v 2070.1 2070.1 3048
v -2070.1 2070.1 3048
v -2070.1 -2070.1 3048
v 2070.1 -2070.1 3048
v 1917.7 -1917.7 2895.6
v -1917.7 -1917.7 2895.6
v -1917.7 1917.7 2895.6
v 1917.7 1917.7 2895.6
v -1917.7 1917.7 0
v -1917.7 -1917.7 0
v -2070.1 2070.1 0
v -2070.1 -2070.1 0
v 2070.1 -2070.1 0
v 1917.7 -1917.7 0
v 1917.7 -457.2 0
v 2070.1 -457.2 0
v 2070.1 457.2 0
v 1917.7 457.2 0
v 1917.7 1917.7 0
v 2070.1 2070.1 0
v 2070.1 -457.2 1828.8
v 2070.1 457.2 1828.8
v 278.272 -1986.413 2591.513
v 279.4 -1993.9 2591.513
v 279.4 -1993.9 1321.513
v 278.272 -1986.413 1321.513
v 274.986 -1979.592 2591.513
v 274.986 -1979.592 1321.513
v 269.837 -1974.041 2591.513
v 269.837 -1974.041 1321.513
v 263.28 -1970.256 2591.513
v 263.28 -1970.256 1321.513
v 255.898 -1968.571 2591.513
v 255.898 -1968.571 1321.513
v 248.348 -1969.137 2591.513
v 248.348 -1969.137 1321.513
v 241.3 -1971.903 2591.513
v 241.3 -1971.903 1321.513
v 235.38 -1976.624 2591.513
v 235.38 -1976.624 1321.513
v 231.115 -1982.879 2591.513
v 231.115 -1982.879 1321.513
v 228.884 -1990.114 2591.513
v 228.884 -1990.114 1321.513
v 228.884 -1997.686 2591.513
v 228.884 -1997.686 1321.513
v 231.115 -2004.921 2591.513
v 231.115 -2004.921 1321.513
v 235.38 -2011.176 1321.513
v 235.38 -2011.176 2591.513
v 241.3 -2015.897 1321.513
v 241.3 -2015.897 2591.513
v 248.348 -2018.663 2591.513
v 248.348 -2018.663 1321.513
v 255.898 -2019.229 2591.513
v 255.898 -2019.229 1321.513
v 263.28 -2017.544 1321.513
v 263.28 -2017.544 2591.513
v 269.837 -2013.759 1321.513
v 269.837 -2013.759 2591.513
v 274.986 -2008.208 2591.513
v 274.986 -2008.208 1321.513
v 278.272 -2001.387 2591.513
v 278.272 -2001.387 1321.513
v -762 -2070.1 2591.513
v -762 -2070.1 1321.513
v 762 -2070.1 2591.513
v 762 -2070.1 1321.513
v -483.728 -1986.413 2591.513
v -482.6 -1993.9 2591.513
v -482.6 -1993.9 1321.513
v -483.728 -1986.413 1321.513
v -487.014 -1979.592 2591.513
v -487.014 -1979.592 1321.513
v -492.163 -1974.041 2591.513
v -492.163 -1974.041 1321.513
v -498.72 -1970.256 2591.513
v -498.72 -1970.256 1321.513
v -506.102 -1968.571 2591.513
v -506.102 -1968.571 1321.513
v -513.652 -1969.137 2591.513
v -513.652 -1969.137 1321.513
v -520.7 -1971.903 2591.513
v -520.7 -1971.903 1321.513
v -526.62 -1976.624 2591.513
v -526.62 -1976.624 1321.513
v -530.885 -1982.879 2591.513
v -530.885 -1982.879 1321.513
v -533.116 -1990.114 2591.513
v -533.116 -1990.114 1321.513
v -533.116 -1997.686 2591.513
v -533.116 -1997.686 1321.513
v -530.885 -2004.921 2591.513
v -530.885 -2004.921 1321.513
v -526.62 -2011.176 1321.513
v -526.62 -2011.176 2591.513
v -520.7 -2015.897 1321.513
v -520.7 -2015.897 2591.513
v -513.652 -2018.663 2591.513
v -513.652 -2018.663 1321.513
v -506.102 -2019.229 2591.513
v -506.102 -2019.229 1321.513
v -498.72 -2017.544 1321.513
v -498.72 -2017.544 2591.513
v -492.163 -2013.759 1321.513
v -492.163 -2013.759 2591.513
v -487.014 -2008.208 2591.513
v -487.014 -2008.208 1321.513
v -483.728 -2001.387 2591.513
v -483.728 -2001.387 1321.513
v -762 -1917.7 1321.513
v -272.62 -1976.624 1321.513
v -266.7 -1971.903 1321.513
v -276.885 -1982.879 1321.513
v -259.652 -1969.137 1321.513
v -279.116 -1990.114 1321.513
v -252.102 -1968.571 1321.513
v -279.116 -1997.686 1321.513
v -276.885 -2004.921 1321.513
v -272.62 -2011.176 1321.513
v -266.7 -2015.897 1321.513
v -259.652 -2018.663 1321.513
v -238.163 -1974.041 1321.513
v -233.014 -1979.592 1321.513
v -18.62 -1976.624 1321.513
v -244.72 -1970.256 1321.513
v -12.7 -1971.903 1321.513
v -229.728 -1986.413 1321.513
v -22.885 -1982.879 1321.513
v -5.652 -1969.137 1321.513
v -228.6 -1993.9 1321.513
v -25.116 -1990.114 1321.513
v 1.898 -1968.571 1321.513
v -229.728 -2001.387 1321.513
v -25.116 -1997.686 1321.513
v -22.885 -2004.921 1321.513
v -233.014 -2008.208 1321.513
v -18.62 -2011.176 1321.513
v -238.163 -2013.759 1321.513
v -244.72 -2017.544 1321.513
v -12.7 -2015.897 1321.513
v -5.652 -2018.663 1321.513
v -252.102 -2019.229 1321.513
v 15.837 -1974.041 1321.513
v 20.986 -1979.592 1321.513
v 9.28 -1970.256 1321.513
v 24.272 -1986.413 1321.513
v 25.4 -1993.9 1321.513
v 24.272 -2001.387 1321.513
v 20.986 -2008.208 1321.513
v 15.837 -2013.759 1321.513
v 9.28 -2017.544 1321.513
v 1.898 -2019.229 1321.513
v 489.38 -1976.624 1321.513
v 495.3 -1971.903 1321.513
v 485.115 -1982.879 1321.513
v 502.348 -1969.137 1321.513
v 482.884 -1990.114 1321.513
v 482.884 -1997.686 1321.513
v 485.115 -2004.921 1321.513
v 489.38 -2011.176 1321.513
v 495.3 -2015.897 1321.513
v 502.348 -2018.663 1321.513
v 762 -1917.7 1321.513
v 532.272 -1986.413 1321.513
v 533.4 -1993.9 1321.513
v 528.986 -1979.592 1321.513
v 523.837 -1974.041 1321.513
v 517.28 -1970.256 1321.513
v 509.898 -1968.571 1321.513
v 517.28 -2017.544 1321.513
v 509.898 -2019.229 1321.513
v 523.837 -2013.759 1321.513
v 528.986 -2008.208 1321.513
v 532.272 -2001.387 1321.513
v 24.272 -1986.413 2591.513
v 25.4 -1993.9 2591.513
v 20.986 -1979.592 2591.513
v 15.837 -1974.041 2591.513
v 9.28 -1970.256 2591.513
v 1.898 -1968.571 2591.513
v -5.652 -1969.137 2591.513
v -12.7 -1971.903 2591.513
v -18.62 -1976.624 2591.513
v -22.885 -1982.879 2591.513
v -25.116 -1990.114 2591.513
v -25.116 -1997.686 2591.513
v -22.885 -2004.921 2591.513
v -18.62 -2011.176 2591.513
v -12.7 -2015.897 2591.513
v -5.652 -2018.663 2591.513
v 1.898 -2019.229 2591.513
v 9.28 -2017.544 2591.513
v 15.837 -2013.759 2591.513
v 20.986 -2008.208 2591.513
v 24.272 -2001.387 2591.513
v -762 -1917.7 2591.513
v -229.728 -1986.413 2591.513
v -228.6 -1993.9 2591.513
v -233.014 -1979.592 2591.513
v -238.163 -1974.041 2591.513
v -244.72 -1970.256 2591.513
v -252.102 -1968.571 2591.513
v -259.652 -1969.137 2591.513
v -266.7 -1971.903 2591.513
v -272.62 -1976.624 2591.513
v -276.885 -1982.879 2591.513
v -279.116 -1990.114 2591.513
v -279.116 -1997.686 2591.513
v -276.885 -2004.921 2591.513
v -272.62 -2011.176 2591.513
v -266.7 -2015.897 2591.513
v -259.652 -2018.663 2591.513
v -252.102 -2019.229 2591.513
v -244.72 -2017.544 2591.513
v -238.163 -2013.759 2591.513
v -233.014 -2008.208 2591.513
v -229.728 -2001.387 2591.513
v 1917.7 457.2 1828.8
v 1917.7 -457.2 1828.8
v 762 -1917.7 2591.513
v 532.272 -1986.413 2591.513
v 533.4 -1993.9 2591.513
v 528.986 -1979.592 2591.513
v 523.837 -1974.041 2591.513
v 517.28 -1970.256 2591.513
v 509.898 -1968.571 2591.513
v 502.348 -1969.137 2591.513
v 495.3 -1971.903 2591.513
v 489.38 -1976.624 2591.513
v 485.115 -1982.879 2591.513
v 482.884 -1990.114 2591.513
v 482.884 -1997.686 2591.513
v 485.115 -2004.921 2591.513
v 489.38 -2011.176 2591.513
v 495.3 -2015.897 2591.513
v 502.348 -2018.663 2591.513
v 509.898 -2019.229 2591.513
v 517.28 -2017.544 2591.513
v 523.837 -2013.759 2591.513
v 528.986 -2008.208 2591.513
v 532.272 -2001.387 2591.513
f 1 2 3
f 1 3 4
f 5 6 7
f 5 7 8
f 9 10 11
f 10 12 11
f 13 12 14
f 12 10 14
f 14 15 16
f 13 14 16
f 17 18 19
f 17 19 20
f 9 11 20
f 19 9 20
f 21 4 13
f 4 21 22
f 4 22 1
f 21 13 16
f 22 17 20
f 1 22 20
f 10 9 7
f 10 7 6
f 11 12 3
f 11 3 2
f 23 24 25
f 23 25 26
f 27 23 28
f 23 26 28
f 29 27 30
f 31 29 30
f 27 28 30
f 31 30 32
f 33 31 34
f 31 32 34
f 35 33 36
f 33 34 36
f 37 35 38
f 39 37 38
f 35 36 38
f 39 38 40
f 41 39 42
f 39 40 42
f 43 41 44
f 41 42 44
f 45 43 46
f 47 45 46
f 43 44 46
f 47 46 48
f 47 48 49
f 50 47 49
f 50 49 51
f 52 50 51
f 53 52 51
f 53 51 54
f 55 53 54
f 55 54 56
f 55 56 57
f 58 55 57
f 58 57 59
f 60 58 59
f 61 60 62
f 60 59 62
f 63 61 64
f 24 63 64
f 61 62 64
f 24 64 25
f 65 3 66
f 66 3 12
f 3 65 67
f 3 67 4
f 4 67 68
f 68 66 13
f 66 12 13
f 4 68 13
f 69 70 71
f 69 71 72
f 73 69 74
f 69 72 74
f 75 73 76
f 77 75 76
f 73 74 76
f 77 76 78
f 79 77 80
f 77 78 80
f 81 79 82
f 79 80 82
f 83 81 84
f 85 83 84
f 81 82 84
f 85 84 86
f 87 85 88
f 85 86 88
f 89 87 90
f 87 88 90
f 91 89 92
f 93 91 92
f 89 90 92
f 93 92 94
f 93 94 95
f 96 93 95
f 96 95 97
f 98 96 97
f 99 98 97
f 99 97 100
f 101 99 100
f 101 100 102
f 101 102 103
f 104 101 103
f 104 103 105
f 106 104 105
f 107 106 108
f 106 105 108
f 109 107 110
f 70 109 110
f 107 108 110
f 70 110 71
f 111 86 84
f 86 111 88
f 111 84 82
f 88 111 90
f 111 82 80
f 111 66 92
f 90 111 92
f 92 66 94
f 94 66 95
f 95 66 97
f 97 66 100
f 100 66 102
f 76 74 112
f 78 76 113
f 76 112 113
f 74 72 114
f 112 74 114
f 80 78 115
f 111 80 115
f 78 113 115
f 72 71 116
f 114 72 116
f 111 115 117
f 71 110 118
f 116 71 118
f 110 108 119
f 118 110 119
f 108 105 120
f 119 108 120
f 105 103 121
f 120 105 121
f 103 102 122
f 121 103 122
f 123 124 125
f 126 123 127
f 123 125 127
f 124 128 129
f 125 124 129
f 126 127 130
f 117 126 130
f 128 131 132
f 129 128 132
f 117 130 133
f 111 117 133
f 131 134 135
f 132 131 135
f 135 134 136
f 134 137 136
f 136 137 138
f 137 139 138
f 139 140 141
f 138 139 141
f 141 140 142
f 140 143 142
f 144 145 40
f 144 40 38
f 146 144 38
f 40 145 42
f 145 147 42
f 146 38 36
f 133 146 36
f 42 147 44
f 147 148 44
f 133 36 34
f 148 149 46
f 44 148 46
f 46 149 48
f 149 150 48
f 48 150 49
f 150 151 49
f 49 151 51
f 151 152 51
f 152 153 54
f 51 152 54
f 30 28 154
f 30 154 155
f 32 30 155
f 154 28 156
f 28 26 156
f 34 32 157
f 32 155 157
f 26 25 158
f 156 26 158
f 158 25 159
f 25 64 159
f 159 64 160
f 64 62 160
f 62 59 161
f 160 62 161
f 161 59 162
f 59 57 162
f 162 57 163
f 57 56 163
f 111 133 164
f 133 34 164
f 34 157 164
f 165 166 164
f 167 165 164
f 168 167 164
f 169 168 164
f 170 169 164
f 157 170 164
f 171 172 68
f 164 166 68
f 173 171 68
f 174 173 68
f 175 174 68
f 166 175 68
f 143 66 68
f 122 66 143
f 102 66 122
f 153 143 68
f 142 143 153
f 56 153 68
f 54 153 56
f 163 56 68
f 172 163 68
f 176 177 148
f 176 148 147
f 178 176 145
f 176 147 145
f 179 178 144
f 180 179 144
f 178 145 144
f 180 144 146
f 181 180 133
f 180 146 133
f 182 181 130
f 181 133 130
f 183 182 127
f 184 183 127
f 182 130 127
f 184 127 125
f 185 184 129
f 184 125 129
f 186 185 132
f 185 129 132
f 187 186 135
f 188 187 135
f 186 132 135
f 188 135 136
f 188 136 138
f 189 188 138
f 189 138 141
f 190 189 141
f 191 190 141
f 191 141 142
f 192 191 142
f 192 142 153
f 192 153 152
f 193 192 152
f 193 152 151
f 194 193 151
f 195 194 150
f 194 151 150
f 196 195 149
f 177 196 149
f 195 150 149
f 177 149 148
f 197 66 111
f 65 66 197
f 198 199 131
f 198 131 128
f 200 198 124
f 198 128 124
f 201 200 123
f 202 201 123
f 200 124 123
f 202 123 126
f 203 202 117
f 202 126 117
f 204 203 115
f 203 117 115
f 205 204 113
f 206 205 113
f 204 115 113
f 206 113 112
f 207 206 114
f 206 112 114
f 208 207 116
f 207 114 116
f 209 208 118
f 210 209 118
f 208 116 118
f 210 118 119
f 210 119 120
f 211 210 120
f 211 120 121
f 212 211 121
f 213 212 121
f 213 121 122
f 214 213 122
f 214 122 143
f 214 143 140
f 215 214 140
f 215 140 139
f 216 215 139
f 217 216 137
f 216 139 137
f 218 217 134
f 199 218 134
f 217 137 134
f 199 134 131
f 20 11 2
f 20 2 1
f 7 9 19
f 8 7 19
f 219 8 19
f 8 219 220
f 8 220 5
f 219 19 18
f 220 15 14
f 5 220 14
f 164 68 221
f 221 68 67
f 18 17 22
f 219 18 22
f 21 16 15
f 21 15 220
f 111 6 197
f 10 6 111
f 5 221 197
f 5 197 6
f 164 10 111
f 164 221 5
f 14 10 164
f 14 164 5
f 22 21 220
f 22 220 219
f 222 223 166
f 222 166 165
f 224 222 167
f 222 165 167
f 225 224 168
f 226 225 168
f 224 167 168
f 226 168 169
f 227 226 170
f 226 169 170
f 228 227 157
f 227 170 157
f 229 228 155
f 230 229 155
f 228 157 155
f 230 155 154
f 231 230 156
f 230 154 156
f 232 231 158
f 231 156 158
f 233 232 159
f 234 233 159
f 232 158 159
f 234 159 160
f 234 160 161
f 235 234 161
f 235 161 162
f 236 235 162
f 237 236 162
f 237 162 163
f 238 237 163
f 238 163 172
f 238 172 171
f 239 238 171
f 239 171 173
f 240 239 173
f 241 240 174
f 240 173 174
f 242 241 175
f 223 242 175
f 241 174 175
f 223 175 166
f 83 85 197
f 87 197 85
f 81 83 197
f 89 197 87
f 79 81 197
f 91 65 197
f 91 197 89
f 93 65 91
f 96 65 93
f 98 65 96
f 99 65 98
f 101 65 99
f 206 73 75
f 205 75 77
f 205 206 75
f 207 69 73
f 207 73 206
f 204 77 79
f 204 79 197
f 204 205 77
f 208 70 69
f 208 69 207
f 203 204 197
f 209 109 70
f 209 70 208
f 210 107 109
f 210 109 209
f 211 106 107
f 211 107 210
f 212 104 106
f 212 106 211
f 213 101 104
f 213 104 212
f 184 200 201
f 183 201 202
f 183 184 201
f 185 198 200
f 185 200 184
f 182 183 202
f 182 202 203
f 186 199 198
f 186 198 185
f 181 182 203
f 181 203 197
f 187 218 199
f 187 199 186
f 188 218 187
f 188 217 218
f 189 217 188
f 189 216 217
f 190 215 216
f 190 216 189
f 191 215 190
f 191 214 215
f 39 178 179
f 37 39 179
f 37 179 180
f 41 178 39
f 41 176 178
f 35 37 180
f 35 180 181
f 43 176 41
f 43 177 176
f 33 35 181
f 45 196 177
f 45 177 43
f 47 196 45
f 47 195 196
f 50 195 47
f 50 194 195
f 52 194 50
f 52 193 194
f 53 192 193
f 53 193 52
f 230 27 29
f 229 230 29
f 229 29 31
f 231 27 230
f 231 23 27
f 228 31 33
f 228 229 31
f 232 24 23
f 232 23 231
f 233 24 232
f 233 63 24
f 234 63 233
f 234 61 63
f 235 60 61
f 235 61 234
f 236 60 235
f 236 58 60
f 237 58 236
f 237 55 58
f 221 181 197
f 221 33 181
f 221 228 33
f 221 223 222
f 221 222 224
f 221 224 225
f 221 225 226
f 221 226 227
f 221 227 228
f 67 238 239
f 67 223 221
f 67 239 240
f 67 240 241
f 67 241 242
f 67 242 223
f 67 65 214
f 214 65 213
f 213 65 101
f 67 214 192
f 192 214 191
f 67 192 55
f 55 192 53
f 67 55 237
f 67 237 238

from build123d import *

# Parameters (mm, degrees)
F0_W     = 4140.2
F0_H     = 4140.2
F1_DEPTH = 3048
F2_W     = 1524
F2_H     = 1270
F3_DEPTH = 152.4
F4_W     = 3835.4
F4_H     = 3835.4
F5_DEPTH = 2895.6
F6_R     = 25.4
F7_DEPTH = 1270
F8_W     = 914.4
F8_H     = 3657.6
F9_DEPTH = 152.4


with BuildPart() as f1:
    # F0 (on Top) → F1 (new body)
    with BuildSketch(Plane.XY):
        Rectangle(F0_W, F0_H)
    extrude(amount=F1_DEPTH)

    # F2 (on face) → F3 (cut)
    with BuildSketch(Plane.XZ.offset(2070.1)):
        with Locations((0, 1956.513322)):
            Rectangle(F2_W, F2_H)
    extrude(amount=-F3_DEPTH, mode=Mode.SUBTRACT)

    # F4 (on face) → F5 (cut)
    with BuildSketch(Plane(origin=(0, 0, 0), x_dir=(1, 0, 0), z_dir=(0, 0, -1))):
        Rectangle(F4_W, F4_H)
    extrude(amount=-F5_DEPTH, mode=Mode.SUBTRACT)

    # F6 (on face) → F7 (join)
    with BuildSketch(Plane.XY.offset(1321.513322)):
        with Locations((-508, -1993.9)):
            Circle(F6_R)
        with Locations((0, -1993.9)):
            Circle(F6_R)
        with Locations((508, -1993.9)):
            Circle(F6_R)
        with Locations((-254, -1993.9)):
            Circle(F6_R)
        with Locations((254, -1993.9)):
            Circle(F6_R)
    extrude(amount=F7_DEPTH)

    # F8 (on face) → F9 (cut)
    with BuildSketch(Plane.YZ.offset(2070.1)):
        Rectangle(F8_W, F8_H)
    extrude(amount=-F9_DEPTH, mode=Mode.SUBTRACT)


solid = f1.part
